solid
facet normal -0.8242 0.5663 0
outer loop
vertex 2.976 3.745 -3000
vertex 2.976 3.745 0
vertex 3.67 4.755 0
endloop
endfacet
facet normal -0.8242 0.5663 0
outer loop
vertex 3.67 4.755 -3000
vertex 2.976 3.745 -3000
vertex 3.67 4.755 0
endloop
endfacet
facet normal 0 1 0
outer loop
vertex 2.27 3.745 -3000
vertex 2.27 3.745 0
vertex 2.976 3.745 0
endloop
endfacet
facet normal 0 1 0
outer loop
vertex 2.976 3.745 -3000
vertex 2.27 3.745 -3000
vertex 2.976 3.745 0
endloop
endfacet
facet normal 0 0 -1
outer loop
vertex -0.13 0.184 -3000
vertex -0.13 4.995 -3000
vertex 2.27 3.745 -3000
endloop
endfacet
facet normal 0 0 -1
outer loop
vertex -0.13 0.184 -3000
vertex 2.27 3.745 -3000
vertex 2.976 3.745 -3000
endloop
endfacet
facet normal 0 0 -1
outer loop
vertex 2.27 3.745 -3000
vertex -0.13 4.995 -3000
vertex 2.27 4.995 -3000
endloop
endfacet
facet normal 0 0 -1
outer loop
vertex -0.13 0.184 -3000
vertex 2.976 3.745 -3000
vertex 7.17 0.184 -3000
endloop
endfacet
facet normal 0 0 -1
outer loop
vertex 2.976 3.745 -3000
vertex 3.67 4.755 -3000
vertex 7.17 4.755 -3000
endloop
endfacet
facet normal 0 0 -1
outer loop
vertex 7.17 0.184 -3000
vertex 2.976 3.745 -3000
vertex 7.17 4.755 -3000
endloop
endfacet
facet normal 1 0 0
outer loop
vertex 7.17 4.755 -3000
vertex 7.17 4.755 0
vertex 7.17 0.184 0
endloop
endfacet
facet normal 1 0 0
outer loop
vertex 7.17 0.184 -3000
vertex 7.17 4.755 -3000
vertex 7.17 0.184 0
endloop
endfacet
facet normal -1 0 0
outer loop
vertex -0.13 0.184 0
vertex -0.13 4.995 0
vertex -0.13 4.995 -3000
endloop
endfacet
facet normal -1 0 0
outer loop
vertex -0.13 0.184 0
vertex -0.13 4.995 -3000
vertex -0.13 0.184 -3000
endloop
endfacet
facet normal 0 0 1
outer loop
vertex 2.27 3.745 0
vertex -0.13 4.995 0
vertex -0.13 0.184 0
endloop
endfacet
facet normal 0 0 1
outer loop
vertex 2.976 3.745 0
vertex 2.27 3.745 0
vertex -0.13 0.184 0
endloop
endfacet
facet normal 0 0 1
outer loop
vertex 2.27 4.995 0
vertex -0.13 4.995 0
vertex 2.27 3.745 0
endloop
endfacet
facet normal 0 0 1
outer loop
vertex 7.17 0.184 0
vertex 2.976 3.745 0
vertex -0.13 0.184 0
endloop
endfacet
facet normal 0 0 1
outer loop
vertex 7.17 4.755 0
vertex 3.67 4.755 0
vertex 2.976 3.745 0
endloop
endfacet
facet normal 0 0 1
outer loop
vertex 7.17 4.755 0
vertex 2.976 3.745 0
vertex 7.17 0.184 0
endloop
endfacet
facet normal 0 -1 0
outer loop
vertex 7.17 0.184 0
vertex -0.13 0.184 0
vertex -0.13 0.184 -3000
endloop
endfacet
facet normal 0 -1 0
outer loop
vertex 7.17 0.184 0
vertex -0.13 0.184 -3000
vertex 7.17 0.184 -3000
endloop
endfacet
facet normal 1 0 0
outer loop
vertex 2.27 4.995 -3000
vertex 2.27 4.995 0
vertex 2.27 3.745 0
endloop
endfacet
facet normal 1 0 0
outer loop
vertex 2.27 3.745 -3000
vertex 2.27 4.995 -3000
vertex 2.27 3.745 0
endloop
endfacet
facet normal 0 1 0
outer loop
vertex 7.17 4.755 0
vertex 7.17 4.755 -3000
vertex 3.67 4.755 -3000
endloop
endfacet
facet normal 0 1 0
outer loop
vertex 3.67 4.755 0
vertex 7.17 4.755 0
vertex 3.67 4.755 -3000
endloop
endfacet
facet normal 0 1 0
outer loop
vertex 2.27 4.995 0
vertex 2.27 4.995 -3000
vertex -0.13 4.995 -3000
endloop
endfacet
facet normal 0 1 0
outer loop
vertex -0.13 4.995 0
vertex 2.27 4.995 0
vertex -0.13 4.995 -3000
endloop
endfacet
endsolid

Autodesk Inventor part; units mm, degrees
ref_plane "YZ Plane" through (0, 0, 0) normal (1, 0, 0) x (0, 1, 0)
ref_plane "XZ Plane" through (0, 0, 0) normal (0, 1, 0) x (-1, 0, 0)
ref_plane "XY Plane" through (0, 0, 0) normal (0, 0, 1) x (1, 0, 0)
sketch "Boceto1" plane through (0, 0, 0) normal (0, 0, 1) x (1, 0, 0)
  line L0 (2.2697, 4.9951) -> (-0.1303, 4.9951)
  line L1 (-0.1303, 4.9951) -> (-0.1303, 0.1843)
  line L2 (2.2697, 4.9951) -> (2.2697, 3.7451)
  line L3 (2.2697, 3.7451) -> (2.9755, 3.7451)
  line L4 (2.9755, 3.7451) -> (3.6697, 4.7551)
  line L5 (-0.1303, 0.1843) -> (7.1697, 0.1843)
  line L6 (7.1697, 4.7551) -> (7.1697, 0.1843)
  line L7 (7.1697, 4.7551) -> (3.6697, 4.7551)
  dimension "d93" = 4.8108
  dimension "d94" = 0.24
  dimension "d95" = 2.4
  dimension "d96" = 0.7058
  dimension "d97" = 1.25
  dimension "d98" = 1.01
  dimension "d99" = 124.5
  dimension "d100" = 7.3
extrude "Extrusión1" add sketch "Boceto1" against normal blind 3000
properties part number "SP40-04A JUNTA INT CRISTAL ZOCALO 602 mm" material "Caucho"
